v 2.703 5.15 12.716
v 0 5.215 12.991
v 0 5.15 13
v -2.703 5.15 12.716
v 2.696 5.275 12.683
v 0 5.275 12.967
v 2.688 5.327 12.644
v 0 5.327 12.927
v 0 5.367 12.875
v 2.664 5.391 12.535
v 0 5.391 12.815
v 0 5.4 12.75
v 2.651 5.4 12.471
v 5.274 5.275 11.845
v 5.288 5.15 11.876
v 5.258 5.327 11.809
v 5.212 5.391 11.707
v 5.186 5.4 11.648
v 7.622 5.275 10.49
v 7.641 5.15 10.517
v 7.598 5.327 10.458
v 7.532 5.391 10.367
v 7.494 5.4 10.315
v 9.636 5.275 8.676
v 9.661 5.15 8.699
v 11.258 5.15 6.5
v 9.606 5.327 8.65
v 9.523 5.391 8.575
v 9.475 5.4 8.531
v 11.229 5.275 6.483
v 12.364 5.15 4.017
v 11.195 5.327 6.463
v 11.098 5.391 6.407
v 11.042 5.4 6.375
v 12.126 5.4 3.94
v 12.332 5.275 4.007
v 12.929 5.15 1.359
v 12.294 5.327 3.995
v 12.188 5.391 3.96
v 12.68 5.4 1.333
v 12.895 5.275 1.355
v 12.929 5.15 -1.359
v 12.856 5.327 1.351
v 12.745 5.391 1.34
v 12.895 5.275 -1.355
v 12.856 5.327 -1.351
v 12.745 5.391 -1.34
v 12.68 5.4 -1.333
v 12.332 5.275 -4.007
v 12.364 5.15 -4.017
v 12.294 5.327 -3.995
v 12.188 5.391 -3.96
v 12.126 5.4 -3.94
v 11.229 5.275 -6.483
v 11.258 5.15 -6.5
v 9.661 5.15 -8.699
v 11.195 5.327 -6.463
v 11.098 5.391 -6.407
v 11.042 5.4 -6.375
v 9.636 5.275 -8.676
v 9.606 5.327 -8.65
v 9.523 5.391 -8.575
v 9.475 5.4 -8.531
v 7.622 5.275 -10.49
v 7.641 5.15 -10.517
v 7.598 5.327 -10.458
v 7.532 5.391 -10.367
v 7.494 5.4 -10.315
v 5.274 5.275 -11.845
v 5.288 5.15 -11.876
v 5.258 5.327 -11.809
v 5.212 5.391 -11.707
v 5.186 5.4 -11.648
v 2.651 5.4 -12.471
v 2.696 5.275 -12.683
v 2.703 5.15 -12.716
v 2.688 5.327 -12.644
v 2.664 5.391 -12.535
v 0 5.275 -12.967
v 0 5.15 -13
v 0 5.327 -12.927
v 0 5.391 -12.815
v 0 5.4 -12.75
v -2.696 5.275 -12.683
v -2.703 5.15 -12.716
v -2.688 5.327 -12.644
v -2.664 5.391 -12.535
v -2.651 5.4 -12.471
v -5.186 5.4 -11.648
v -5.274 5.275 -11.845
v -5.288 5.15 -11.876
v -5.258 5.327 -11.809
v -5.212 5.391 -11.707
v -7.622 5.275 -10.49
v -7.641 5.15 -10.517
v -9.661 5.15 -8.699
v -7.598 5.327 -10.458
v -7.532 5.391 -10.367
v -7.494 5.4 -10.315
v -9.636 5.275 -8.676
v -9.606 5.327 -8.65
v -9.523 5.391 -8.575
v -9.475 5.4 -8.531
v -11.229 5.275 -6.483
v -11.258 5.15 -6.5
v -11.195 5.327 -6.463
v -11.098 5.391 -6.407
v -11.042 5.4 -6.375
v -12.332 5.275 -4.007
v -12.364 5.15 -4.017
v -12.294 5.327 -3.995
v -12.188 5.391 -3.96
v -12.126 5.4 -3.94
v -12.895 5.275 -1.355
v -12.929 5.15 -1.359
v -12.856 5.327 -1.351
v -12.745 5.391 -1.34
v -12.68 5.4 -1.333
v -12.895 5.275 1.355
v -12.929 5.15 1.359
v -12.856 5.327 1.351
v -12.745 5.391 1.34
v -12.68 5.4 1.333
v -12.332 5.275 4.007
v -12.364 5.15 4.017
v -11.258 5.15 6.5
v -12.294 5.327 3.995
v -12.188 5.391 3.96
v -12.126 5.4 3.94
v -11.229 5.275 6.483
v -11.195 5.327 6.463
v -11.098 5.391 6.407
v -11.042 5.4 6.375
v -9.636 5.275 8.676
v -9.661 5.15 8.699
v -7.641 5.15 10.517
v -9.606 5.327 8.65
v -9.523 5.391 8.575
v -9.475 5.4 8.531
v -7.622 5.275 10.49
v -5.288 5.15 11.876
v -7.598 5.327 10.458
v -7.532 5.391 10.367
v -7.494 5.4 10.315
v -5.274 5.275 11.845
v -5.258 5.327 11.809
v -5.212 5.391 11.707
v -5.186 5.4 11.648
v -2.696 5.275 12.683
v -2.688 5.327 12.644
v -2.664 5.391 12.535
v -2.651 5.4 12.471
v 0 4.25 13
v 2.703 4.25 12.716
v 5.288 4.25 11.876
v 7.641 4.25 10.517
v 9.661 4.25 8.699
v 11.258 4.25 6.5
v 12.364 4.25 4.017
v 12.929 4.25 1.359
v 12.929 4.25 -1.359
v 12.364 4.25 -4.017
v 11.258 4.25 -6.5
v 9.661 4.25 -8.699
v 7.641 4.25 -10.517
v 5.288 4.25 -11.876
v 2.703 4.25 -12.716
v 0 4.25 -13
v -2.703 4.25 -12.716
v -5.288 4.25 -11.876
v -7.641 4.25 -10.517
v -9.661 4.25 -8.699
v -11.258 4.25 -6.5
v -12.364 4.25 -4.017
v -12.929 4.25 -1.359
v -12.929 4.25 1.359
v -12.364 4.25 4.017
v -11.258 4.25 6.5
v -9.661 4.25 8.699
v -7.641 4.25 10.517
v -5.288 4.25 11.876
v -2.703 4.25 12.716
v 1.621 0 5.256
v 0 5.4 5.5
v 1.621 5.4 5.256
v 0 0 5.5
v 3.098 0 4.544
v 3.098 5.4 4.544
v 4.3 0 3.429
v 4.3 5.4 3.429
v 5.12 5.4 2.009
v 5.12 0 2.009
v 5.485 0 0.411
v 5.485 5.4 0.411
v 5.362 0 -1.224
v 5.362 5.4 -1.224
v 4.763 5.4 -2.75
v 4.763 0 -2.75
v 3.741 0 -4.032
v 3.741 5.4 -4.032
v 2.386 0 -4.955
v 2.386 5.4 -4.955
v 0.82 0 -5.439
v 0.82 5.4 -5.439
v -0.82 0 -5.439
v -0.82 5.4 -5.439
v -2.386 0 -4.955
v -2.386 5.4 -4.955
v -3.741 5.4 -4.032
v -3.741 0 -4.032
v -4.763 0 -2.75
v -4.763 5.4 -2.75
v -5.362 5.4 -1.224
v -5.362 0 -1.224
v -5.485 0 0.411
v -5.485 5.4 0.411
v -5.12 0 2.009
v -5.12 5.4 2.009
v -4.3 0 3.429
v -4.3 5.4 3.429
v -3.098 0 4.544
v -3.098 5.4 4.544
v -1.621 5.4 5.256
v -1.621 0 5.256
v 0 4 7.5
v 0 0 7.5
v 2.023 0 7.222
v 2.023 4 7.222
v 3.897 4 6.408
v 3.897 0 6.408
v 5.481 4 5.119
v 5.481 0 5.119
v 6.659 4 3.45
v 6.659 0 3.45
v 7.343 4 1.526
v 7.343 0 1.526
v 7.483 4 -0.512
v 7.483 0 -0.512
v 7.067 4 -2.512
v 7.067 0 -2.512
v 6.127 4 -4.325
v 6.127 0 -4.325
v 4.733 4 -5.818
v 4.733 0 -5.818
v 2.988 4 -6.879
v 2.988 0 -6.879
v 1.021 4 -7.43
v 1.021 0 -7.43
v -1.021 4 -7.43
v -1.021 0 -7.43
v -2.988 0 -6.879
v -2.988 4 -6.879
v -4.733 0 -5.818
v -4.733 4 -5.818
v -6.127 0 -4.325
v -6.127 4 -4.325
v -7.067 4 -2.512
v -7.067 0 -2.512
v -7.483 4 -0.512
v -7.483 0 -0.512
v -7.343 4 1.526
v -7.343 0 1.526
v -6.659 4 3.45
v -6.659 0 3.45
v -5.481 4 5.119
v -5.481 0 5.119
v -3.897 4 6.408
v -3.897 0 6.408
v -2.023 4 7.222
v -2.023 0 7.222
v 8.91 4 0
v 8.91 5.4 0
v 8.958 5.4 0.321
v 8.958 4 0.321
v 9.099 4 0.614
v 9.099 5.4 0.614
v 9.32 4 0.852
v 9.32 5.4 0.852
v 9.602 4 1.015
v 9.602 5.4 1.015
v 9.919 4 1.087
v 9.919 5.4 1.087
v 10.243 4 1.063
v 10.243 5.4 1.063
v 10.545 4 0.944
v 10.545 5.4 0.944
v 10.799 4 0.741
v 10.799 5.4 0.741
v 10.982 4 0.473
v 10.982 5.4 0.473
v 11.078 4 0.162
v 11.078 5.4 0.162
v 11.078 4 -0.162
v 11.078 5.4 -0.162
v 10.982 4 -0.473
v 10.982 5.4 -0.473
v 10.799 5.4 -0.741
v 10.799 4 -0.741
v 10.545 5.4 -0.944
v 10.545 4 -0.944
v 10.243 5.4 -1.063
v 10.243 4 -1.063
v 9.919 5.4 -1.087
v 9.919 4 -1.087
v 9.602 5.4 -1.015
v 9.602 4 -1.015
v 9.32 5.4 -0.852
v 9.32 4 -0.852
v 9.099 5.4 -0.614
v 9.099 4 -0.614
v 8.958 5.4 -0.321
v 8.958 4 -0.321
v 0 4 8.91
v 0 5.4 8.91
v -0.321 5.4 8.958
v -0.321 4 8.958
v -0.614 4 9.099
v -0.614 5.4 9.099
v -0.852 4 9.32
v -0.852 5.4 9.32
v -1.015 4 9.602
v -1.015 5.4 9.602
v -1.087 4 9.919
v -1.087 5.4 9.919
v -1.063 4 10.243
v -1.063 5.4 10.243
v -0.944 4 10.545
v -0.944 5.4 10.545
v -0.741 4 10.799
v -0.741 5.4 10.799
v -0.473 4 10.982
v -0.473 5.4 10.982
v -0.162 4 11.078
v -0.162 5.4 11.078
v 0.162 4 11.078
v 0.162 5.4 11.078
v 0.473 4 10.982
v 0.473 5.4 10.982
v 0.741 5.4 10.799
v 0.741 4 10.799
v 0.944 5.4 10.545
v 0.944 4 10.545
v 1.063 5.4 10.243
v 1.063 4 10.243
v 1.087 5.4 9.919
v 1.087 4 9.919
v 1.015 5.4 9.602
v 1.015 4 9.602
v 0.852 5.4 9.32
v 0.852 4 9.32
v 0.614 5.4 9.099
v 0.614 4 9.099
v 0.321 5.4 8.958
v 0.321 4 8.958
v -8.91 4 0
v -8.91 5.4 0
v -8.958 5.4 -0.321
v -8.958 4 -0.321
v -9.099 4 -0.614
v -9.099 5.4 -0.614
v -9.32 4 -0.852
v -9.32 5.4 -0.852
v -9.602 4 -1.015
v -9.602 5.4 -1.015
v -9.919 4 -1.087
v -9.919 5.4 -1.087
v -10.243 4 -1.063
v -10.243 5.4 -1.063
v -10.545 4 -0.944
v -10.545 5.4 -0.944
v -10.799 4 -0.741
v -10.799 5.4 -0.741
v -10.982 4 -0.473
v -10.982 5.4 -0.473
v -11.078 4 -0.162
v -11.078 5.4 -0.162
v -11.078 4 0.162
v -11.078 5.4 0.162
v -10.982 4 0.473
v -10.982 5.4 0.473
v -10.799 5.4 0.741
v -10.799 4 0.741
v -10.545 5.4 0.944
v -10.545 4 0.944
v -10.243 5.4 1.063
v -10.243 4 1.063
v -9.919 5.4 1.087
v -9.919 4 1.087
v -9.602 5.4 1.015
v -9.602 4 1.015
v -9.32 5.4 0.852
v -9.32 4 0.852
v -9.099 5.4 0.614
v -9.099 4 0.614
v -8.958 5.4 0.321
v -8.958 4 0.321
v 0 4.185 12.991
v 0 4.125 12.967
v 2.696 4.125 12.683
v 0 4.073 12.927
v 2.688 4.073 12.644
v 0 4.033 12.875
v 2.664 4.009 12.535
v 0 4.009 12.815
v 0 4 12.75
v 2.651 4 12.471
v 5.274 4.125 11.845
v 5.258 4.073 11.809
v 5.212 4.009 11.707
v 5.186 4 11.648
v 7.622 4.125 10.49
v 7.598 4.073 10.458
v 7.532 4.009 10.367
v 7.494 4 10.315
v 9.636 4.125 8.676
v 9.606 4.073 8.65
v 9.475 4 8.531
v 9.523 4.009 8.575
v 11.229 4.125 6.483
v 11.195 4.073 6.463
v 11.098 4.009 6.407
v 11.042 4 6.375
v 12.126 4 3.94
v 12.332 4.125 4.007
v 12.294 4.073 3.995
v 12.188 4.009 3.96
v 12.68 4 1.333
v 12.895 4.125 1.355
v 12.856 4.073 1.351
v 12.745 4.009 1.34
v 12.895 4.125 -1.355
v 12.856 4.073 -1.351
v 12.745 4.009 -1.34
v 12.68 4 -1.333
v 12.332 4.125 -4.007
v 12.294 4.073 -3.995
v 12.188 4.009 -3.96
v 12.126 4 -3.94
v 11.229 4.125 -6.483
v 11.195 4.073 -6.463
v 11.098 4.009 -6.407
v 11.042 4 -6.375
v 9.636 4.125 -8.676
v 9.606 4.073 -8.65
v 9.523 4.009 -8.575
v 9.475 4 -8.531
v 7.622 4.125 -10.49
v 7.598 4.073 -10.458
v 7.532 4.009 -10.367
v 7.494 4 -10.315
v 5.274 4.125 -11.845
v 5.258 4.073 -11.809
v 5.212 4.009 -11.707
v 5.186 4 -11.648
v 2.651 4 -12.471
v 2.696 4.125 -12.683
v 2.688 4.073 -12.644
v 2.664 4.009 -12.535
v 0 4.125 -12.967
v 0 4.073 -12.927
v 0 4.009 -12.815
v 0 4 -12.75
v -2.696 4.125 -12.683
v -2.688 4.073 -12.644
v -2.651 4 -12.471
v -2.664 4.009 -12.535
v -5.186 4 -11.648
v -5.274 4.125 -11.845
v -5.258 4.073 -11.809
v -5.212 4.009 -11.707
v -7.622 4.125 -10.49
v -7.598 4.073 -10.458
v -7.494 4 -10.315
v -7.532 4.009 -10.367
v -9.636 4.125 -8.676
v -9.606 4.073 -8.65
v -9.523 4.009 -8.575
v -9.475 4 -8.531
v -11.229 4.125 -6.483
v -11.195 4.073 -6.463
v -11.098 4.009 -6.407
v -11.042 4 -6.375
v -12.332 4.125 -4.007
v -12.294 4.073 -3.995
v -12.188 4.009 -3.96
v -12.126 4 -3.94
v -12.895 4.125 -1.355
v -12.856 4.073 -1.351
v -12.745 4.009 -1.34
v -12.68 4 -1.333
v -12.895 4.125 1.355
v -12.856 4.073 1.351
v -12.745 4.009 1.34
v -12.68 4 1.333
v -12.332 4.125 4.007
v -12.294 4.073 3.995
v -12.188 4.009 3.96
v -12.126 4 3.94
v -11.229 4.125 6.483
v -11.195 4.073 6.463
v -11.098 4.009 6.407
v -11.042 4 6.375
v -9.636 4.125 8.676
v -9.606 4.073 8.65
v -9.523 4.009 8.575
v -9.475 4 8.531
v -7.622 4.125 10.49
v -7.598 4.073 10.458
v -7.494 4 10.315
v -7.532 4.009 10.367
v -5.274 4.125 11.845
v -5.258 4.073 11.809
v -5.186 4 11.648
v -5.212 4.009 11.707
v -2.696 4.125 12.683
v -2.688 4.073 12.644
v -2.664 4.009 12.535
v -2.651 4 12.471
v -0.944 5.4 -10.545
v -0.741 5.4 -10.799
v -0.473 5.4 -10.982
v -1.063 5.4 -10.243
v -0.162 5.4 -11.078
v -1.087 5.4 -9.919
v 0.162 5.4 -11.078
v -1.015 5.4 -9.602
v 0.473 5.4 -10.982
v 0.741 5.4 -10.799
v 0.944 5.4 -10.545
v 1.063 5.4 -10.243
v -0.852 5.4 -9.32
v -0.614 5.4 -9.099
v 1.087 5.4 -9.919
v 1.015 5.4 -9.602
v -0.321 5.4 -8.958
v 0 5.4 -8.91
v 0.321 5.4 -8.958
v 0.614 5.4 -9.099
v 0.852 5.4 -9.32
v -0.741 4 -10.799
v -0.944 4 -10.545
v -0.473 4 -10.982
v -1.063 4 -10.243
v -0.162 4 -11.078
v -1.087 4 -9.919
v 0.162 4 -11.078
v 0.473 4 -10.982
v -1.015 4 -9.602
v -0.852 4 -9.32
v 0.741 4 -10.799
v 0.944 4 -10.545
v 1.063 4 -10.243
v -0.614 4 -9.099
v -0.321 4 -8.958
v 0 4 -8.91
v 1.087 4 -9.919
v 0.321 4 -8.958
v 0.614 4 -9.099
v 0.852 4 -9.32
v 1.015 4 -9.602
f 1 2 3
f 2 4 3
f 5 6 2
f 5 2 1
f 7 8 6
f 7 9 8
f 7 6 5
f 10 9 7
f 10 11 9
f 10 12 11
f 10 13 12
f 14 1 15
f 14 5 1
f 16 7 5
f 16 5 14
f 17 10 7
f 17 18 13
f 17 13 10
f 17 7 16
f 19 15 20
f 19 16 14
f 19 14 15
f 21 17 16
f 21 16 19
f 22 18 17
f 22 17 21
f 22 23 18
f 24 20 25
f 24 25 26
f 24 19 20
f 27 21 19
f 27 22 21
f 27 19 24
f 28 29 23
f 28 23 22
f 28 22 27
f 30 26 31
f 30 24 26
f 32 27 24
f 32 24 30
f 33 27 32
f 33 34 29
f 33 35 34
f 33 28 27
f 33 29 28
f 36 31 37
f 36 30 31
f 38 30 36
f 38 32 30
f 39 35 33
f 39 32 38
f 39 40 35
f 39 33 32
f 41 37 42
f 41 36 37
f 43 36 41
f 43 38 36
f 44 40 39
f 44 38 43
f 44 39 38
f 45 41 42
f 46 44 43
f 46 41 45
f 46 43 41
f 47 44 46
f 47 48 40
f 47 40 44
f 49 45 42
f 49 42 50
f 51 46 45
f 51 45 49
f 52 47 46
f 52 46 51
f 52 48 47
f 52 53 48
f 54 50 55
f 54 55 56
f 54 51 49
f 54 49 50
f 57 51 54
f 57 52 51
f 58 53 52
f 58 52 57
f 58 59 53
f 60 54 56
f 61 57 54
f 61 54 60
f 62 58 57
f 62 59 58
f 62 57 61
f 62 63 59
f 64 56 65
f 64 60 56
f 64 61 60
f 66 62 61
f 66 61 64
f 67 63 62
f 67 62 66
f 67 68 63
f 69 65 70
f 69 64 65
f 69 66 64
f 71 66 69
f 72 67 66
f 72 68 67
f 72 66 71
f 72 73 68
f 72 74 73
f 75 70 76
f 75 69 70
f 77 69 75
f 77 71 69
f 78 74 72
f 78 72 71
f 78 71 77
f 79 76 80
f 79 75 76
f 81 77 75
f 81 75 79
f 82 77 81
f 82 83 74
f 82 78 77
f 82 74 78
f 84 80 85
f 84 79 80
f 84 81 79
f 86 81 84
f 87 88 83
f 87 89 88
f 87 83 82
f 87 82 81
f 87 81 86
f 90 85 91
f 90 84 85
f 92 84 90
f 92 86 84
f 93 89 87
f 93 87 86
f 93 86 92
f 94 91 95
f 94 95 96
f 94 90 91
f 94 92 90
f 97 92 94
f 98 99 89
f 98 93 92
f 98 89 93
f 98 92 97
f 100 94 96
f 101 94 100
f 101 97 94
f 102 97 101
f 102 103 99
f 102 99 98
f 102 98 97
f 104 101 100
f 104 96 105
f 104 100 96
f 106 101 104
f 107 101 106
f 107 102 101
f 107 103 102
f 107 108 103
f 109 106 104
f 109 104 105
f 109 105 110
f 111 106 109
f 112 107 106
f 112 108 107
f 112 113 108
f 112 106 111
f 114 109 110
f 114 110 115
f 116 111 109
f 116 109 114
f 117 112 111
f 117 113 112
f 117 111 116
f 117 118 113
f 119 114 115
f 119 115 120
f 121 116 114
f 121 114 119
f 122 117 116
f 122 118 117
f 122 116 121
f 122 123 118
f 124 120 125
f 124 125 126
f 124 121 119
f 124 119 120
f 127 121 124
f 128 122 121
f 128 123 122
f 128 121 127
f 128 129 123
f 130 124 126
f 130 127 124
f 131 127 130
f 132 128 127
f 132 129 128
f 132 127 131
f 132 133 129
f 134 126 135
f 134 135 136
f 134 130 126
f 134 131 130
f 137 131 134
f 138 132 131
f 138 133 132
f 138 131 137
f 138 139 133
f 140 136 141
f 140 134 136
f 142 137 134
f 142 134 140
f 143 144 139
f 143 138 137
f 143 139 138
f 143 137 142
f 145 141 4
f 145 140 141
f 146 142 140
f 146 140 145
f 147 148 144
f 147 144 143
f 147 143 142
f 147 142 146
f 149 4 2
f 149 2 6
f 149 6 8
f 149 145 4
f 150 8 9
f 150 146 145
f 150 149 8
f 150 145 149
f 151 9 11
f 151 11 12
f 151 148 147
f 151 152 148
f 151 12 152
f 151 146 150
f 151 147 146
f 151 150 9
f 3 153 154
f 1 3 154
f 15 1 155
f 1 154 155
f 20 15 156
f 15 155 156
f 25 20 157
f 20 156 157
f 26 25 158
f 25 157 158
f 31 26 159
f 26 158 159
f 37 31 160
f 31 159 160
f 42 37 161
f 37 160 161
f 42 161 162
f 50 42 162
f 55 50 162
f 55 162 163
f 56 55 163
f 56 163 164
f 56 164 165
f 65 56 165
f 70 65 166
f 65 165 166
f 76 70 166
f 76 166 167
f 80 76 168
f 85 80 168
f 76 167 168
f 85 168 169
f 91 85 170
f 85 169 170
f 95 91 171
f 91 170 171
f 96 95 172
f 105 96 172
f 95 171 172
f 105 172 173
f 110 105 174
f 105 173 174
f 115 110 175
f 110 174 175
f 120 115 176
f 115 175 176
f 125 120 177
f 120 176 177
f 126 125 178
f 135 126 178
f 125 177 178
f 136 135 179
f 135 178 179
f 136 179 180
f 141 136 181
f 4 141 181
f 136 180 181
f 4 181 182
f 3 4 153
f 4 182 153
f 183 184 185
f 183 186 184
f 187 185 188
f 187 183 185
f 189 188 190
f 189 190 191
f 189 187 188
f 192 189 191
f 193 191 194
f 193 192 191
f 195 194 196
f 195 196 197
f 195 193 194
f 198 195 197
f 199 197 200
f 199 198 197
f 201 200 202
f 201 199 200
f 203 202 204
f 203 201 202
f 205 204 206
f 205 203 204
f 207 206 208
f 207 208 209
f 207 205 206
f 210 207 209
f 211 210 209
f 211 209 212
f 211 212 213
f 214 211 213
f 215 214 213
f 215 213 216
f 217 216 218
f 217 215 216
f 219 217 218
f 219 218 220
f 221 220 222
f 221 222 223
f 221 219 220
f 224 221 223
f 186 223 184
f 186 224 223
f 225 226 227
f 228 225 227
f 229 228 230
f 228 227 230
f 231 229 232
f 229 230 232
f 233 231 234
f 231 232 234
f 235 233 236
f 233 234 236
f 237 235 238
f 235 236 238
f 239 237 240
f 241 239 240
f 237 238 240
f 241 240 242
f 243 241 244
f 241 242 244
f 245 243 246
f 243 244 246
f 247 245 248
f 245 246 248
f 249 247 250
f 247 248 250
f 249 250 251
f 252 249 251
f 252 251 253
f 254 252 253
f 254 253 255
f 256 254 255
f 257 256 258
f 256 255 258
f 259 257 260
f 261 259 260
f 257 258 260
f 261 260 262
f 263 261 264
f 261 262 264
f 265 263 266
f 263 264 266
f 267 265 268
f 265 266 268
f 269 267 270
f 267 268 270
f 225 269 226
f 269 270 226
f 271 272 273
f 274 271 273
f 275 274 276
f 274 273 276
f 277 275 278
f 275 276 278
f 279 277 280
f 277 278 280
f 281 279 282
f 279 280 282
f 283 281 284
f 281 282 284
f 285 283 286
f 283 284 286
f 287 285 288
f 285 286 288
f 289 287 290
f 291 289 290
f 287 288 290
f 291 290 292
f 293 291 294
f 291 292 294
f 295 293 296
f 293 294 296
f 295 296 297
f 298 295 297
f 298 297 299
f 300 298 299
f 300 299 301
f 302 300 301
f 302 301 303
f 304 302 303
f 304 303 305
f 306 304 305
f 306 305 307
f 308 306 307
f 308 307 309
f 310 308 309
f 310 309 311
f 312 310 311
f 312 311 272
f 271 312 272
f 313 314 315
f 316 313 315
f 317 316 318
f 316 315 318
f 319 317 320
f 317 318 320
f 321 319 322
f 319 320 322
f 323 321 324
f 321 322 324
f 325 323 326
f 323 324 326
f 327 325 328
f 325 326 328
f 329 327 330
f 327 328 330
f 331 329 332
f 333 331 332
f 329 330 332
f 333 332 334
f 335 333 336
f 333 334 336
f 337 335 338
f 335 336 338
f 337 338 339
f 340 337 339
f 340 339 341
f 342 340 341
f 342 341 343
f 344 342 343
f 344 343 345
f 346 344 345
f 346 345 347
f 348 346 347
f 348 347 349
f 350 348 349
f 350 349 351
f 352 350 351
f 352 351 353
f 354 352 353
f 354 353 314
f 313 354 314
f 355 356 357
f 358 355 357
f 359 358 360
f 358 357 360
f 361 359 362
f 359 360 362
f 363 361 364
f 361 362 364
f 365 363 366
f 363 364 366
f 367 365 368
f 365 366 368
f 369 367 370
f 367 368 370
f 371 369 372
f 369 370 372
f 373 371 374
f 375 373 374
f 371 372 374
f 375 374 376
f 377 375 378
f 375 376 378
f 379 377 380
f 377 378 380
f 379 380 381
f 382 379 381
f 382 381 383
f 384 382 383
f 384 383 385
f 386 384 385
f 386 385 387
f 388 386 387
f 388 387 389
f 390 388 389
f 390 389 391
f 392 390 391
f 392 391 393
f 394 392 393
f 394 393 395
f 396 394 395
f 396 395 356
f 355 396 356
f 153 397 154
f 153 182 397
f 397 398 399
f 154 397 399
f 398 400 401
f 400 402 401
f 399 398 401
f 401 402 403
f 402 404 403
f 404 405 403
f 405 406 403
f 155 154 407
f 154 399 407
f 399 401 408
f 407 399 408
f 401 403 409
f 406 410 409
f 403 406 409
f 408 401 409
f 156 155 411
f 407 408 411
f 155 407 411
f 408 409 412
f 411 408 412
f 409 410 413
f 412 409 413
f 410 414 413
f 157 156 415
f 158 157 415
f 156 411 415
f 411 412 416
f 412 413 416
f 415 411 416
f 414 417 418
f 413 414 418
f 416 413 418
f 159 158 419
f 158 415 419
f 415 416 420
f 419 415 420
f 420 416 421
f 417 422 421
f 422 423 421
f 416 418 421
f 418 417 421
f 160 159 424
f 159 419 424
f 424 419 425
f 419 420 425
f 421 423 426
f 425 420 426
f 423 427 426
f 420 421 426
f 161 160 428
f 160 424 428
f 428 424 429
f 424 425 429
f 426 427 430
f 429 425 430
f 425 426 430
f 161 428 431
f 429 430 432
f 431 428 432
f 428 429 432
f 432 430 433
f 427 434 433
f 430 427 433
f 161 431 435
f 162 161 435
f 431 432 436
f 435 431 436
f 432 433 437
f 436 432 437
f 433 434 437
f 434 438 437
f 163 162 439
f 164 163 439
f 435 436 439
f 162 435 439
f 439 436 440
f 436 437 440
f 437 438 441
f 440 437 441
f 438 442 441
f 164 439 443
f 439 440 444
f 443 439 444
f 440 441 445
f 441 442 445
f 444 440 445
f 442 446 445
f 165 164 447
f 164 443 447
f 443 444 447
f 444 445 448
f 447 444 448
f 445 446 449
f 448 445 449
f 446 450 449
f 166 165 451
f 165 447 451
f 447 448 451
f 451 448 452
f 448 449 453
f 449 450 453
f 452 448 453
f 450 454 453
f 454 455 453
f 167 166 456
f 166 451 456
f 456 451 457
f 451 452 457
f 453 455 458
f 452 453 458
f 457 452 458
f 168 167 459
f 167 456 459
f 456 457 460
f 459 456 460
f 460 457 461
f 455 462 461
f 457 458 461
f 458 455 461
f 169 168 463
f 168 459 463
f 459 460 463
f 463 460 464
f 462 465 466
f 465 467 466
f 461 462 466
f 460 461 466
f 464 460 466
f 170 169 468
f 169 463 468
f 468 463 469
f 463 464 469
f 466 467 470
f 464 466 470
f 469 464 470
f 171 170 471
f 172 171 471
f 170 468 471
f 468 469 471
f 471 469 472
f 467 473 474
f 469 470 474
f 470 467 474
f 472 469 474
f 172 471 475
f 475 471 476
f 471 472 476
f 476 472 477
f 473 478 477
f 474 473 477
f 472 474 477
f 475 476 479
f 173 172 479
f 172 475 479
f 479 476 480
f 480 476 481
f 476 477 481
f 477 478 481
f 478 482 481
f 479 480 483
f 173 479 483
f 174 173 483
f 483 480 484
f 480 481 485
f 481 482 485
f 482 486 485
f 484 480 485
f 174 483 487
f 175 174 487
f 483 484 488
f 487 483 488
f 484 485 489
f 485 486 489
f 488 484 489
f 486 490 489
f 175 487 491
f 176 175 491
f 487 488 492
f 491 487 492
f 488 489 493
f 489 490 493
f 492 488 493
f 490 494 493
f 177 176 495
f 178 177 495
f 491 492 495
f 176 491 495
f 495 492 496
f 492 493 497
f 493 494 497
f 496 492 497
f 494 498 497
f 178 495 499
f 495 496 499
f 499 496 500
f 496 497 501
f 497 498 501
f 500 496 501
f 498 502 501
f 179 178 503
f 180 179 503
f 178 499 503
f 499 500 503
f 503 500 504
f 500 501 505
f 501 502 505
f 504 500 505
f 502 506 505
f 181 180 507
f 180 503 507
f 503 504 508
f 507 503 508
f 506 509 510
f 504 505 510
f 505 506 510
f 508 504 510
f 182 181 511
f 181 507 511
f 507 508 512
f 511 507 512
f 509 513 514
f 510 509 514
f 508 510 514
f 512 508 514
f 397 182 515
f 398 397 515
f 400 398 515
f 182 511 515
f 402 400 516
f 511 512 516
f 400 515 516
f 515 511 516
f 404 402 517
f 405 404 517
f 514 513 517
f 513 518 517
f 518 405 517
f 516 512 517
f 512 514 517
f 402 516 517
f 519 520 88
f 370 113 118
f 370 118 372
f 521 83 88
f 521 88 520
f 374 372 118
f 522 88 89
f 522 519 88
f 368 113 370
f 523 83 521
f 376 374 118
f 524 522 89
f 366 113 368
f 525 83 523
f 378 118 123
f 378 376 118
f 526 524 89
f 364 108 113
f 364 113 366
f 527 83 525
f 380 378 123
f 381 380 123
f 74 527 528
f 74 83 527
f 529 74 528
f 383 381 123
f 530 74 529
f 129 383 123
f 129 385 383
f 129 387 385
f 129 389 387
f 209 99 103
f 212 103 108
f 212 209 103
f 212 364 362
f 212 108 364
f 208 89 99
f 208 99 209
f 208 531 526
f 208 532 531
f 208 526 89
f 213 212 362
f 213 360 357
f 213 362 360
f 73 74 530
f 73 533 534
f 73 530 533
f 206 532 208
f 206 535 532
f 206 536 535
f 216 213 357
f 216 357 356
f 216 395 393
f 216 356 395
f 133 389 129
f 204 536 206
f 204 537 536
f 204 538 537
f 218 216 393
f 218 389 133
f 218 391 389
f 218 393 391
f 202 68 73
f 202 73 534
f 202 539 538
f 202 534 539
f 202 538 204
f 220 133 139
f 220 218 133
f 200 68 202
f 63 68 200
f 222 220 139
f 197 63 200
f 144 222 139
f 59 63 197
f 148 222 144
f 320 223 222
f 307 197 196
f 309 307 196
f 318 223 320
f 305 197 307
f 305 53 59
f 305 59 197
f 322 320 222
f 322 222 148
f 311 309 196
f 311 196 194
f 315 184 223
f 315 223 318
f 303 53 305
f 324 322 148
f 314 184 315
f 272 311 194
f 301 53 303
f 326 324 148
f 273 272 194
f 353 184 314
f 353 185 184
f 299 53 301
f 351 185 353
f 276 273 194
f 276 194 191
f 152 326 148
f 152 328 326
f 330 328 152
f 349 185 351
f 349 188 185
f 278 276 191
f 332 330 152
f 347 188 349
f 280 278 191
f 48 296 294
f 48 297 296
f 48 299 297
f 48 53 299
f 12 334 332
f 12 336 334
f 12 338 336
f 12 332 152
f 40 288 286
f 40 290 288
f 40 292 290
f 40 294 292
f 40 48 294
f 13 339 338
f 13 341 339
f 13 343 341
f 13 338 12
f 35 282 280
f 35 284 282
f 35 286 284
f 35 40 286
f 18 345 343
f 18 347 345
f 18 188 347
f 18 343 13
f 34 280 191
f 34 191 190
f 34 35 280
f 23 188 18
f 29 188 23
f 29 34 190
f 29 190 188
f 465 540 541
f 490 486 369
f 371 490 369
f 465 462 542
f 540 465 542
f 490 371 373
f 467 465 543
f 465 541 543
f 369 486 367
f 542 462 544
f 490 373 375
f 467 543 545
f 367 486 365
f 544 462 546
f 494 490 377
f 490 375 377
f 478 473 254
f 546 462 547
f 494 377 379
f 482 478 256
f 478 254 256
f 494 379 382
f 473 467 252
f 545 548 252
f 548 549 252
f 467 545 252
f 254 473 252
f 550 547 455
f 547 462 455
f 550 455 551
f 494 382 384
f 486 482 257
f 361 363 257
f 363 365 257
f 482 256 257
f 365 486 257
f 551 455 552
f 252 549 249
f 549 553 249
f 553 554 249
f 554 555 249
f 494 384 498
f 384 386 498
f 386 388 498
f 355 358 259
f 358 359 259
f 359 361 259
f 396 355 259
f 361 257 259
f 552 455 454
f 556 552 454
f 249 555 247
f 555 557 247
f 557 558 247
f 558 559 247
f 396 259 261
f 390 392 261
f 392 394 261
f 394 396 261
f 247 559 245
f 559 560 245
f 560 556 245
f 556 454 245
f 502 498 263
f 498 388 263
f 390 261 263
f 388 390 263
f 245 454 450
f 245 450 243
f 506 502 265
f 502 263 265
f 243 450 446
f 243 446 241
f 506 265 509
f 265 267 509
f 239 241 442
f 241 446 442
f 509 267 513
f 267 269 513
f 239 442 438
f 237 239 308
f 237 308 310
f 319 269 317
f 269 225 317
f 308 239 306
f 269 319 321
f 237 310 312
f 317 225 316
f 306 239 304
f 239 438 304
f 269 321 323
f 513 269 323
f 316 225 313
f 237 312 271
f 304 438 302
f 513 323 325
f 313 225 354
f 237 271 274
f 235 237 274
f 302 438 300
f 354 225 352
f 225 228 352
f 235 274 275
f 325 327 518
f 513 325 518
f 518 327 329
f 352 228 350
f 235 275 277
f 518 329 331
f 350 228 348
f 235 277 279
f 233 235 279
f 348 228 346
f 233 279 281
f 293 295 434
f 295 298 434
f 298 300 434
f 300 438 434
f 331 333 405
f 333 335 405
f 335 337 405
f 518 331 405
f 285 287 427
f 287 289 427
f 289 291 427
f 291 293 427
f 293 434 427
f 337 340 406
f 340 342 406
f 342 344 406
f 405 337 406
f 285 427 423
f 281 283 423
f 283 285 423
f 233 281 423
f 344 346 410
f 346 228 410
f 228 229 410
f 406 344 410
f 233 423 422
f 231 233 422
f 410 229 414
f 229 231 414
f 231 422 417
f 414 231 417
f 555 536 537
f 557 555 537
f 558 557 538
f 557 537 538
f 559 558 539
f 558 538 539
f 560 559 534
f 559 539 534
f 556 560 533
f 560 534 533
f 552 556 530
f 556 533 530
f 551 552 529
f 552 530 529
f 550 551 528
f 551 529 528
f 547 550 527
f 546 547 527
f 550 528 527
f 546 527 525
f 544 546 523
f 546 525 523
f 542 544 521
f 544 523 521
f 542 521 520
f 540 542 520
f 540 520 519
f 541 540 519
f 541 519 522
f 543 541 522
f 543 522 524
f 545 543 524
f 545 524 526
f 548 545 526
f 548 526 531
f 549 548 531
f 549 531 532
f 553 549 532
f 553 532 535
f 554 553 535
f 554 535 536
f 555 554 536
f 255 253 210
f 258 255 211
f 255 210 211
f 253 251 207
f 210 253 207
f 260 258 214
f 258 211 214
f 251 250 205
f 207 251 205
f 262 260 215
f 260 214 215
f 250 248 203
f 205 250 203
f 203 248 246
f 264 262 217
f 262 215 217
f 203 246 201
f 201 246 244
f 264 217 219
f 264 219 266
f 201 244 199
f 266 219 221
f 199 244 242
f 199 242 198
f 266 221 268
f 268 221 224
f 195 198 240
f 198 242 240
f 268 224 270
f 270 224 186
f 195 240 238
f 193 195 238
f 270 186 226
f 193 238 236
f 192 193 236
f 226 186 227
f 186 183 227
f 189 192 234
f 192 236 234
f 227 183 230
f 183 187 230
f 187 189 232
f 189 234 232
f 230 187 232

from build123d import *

# Parameters (mm, degrees)
SKETCH1_R           = 7.5
SKETCH1_R_2         = 5.5
BOSS_EXTRUDE1_DEPTH = 4
SKETCH2_R           = 13
SKETCH2_R_2         = 5.5
BOSS_EXTRUDE2_DEPTH = 1.4
SKETCH3_R           = 1.09
CUT_EXTRUDE1_DEPTH  = 20.161419572
CIRPATTERN1_COUNT   = 4
FILLET1_R           = 0.25


with BuildPart() as part:
    # Sketch1 → Boss-Extrude1 (new body)
    with BuildSketch(Plane(origin=(0, 0, 0), x_dir=(1, 0, 0), z_dir=(0, 1, 0))):
        with Locations(Location((0, 0, 0), (0, 0, 270))):
            Circle(SKETCH1_R)
        with Locations(Location((0, 0, 0), (0, 0, 270))):
            Circle(SKETCH1_R_2, mode=Mode.SUBTRACT)
    extrude(amount=BOSS_EXTRUDE1_DEPTH)

    # Sketch2 → Boss-Extrude2 (add)
    with BuildSketch(Plane(origin=(0, 4, 0), x_dir=(1, 0, 0), z_dir=(0, 1, 0))):
        with Locations(Location((0, 0, 0), (0, 0, 270))):
            Circle(SKETCH2_R)
        with Locations(Location((0, 0, 0), (0, 0, 270))):
            Circle(SKETCH2_R_2, mode=Mode.SUBTRACT)
    extrude(amount=BOSS_EXTRUDE2_DEPTH)

    # Sketch3 → Cut-Extrude1 (cut, through all)
    with BuildSketch(Plane(origin=(0, 5.4, 0), x_dir=(1, 0, 0), z_dir=(0, 1, 0))):
        with Locations(Location((0, 10, 0), (0, 0, 270))):
            Circle(SKETCH3_R)
    cut_extrude1 = extrude(amount=-CUT_EXTRUDE1_DEPTH, mode=Mode.SUBTRACT)

    # CirPattern1: Cut-Extrude1 ×4 about axis
    cirpattern1_axis = Axis((0, 0, 0), (0, 1, 0))
    for i in range(1, CIRPATTERN1_COUNT):
        add(cut_extrude1.rotate(cirpattern1_axis, i * 360 / CIRPATTERN1_COUNT), mode=Mode.SUBTRACT)

    # Fillet1
    fillet1_edges = [part.edges().sort_by_distance(p)[0] for p in [
        (0, 4, -13),
        (0, 5.4, -13),
    ]]
    fillet(fillet1_edges, radius=FILLET1_R)


solid = part.part
